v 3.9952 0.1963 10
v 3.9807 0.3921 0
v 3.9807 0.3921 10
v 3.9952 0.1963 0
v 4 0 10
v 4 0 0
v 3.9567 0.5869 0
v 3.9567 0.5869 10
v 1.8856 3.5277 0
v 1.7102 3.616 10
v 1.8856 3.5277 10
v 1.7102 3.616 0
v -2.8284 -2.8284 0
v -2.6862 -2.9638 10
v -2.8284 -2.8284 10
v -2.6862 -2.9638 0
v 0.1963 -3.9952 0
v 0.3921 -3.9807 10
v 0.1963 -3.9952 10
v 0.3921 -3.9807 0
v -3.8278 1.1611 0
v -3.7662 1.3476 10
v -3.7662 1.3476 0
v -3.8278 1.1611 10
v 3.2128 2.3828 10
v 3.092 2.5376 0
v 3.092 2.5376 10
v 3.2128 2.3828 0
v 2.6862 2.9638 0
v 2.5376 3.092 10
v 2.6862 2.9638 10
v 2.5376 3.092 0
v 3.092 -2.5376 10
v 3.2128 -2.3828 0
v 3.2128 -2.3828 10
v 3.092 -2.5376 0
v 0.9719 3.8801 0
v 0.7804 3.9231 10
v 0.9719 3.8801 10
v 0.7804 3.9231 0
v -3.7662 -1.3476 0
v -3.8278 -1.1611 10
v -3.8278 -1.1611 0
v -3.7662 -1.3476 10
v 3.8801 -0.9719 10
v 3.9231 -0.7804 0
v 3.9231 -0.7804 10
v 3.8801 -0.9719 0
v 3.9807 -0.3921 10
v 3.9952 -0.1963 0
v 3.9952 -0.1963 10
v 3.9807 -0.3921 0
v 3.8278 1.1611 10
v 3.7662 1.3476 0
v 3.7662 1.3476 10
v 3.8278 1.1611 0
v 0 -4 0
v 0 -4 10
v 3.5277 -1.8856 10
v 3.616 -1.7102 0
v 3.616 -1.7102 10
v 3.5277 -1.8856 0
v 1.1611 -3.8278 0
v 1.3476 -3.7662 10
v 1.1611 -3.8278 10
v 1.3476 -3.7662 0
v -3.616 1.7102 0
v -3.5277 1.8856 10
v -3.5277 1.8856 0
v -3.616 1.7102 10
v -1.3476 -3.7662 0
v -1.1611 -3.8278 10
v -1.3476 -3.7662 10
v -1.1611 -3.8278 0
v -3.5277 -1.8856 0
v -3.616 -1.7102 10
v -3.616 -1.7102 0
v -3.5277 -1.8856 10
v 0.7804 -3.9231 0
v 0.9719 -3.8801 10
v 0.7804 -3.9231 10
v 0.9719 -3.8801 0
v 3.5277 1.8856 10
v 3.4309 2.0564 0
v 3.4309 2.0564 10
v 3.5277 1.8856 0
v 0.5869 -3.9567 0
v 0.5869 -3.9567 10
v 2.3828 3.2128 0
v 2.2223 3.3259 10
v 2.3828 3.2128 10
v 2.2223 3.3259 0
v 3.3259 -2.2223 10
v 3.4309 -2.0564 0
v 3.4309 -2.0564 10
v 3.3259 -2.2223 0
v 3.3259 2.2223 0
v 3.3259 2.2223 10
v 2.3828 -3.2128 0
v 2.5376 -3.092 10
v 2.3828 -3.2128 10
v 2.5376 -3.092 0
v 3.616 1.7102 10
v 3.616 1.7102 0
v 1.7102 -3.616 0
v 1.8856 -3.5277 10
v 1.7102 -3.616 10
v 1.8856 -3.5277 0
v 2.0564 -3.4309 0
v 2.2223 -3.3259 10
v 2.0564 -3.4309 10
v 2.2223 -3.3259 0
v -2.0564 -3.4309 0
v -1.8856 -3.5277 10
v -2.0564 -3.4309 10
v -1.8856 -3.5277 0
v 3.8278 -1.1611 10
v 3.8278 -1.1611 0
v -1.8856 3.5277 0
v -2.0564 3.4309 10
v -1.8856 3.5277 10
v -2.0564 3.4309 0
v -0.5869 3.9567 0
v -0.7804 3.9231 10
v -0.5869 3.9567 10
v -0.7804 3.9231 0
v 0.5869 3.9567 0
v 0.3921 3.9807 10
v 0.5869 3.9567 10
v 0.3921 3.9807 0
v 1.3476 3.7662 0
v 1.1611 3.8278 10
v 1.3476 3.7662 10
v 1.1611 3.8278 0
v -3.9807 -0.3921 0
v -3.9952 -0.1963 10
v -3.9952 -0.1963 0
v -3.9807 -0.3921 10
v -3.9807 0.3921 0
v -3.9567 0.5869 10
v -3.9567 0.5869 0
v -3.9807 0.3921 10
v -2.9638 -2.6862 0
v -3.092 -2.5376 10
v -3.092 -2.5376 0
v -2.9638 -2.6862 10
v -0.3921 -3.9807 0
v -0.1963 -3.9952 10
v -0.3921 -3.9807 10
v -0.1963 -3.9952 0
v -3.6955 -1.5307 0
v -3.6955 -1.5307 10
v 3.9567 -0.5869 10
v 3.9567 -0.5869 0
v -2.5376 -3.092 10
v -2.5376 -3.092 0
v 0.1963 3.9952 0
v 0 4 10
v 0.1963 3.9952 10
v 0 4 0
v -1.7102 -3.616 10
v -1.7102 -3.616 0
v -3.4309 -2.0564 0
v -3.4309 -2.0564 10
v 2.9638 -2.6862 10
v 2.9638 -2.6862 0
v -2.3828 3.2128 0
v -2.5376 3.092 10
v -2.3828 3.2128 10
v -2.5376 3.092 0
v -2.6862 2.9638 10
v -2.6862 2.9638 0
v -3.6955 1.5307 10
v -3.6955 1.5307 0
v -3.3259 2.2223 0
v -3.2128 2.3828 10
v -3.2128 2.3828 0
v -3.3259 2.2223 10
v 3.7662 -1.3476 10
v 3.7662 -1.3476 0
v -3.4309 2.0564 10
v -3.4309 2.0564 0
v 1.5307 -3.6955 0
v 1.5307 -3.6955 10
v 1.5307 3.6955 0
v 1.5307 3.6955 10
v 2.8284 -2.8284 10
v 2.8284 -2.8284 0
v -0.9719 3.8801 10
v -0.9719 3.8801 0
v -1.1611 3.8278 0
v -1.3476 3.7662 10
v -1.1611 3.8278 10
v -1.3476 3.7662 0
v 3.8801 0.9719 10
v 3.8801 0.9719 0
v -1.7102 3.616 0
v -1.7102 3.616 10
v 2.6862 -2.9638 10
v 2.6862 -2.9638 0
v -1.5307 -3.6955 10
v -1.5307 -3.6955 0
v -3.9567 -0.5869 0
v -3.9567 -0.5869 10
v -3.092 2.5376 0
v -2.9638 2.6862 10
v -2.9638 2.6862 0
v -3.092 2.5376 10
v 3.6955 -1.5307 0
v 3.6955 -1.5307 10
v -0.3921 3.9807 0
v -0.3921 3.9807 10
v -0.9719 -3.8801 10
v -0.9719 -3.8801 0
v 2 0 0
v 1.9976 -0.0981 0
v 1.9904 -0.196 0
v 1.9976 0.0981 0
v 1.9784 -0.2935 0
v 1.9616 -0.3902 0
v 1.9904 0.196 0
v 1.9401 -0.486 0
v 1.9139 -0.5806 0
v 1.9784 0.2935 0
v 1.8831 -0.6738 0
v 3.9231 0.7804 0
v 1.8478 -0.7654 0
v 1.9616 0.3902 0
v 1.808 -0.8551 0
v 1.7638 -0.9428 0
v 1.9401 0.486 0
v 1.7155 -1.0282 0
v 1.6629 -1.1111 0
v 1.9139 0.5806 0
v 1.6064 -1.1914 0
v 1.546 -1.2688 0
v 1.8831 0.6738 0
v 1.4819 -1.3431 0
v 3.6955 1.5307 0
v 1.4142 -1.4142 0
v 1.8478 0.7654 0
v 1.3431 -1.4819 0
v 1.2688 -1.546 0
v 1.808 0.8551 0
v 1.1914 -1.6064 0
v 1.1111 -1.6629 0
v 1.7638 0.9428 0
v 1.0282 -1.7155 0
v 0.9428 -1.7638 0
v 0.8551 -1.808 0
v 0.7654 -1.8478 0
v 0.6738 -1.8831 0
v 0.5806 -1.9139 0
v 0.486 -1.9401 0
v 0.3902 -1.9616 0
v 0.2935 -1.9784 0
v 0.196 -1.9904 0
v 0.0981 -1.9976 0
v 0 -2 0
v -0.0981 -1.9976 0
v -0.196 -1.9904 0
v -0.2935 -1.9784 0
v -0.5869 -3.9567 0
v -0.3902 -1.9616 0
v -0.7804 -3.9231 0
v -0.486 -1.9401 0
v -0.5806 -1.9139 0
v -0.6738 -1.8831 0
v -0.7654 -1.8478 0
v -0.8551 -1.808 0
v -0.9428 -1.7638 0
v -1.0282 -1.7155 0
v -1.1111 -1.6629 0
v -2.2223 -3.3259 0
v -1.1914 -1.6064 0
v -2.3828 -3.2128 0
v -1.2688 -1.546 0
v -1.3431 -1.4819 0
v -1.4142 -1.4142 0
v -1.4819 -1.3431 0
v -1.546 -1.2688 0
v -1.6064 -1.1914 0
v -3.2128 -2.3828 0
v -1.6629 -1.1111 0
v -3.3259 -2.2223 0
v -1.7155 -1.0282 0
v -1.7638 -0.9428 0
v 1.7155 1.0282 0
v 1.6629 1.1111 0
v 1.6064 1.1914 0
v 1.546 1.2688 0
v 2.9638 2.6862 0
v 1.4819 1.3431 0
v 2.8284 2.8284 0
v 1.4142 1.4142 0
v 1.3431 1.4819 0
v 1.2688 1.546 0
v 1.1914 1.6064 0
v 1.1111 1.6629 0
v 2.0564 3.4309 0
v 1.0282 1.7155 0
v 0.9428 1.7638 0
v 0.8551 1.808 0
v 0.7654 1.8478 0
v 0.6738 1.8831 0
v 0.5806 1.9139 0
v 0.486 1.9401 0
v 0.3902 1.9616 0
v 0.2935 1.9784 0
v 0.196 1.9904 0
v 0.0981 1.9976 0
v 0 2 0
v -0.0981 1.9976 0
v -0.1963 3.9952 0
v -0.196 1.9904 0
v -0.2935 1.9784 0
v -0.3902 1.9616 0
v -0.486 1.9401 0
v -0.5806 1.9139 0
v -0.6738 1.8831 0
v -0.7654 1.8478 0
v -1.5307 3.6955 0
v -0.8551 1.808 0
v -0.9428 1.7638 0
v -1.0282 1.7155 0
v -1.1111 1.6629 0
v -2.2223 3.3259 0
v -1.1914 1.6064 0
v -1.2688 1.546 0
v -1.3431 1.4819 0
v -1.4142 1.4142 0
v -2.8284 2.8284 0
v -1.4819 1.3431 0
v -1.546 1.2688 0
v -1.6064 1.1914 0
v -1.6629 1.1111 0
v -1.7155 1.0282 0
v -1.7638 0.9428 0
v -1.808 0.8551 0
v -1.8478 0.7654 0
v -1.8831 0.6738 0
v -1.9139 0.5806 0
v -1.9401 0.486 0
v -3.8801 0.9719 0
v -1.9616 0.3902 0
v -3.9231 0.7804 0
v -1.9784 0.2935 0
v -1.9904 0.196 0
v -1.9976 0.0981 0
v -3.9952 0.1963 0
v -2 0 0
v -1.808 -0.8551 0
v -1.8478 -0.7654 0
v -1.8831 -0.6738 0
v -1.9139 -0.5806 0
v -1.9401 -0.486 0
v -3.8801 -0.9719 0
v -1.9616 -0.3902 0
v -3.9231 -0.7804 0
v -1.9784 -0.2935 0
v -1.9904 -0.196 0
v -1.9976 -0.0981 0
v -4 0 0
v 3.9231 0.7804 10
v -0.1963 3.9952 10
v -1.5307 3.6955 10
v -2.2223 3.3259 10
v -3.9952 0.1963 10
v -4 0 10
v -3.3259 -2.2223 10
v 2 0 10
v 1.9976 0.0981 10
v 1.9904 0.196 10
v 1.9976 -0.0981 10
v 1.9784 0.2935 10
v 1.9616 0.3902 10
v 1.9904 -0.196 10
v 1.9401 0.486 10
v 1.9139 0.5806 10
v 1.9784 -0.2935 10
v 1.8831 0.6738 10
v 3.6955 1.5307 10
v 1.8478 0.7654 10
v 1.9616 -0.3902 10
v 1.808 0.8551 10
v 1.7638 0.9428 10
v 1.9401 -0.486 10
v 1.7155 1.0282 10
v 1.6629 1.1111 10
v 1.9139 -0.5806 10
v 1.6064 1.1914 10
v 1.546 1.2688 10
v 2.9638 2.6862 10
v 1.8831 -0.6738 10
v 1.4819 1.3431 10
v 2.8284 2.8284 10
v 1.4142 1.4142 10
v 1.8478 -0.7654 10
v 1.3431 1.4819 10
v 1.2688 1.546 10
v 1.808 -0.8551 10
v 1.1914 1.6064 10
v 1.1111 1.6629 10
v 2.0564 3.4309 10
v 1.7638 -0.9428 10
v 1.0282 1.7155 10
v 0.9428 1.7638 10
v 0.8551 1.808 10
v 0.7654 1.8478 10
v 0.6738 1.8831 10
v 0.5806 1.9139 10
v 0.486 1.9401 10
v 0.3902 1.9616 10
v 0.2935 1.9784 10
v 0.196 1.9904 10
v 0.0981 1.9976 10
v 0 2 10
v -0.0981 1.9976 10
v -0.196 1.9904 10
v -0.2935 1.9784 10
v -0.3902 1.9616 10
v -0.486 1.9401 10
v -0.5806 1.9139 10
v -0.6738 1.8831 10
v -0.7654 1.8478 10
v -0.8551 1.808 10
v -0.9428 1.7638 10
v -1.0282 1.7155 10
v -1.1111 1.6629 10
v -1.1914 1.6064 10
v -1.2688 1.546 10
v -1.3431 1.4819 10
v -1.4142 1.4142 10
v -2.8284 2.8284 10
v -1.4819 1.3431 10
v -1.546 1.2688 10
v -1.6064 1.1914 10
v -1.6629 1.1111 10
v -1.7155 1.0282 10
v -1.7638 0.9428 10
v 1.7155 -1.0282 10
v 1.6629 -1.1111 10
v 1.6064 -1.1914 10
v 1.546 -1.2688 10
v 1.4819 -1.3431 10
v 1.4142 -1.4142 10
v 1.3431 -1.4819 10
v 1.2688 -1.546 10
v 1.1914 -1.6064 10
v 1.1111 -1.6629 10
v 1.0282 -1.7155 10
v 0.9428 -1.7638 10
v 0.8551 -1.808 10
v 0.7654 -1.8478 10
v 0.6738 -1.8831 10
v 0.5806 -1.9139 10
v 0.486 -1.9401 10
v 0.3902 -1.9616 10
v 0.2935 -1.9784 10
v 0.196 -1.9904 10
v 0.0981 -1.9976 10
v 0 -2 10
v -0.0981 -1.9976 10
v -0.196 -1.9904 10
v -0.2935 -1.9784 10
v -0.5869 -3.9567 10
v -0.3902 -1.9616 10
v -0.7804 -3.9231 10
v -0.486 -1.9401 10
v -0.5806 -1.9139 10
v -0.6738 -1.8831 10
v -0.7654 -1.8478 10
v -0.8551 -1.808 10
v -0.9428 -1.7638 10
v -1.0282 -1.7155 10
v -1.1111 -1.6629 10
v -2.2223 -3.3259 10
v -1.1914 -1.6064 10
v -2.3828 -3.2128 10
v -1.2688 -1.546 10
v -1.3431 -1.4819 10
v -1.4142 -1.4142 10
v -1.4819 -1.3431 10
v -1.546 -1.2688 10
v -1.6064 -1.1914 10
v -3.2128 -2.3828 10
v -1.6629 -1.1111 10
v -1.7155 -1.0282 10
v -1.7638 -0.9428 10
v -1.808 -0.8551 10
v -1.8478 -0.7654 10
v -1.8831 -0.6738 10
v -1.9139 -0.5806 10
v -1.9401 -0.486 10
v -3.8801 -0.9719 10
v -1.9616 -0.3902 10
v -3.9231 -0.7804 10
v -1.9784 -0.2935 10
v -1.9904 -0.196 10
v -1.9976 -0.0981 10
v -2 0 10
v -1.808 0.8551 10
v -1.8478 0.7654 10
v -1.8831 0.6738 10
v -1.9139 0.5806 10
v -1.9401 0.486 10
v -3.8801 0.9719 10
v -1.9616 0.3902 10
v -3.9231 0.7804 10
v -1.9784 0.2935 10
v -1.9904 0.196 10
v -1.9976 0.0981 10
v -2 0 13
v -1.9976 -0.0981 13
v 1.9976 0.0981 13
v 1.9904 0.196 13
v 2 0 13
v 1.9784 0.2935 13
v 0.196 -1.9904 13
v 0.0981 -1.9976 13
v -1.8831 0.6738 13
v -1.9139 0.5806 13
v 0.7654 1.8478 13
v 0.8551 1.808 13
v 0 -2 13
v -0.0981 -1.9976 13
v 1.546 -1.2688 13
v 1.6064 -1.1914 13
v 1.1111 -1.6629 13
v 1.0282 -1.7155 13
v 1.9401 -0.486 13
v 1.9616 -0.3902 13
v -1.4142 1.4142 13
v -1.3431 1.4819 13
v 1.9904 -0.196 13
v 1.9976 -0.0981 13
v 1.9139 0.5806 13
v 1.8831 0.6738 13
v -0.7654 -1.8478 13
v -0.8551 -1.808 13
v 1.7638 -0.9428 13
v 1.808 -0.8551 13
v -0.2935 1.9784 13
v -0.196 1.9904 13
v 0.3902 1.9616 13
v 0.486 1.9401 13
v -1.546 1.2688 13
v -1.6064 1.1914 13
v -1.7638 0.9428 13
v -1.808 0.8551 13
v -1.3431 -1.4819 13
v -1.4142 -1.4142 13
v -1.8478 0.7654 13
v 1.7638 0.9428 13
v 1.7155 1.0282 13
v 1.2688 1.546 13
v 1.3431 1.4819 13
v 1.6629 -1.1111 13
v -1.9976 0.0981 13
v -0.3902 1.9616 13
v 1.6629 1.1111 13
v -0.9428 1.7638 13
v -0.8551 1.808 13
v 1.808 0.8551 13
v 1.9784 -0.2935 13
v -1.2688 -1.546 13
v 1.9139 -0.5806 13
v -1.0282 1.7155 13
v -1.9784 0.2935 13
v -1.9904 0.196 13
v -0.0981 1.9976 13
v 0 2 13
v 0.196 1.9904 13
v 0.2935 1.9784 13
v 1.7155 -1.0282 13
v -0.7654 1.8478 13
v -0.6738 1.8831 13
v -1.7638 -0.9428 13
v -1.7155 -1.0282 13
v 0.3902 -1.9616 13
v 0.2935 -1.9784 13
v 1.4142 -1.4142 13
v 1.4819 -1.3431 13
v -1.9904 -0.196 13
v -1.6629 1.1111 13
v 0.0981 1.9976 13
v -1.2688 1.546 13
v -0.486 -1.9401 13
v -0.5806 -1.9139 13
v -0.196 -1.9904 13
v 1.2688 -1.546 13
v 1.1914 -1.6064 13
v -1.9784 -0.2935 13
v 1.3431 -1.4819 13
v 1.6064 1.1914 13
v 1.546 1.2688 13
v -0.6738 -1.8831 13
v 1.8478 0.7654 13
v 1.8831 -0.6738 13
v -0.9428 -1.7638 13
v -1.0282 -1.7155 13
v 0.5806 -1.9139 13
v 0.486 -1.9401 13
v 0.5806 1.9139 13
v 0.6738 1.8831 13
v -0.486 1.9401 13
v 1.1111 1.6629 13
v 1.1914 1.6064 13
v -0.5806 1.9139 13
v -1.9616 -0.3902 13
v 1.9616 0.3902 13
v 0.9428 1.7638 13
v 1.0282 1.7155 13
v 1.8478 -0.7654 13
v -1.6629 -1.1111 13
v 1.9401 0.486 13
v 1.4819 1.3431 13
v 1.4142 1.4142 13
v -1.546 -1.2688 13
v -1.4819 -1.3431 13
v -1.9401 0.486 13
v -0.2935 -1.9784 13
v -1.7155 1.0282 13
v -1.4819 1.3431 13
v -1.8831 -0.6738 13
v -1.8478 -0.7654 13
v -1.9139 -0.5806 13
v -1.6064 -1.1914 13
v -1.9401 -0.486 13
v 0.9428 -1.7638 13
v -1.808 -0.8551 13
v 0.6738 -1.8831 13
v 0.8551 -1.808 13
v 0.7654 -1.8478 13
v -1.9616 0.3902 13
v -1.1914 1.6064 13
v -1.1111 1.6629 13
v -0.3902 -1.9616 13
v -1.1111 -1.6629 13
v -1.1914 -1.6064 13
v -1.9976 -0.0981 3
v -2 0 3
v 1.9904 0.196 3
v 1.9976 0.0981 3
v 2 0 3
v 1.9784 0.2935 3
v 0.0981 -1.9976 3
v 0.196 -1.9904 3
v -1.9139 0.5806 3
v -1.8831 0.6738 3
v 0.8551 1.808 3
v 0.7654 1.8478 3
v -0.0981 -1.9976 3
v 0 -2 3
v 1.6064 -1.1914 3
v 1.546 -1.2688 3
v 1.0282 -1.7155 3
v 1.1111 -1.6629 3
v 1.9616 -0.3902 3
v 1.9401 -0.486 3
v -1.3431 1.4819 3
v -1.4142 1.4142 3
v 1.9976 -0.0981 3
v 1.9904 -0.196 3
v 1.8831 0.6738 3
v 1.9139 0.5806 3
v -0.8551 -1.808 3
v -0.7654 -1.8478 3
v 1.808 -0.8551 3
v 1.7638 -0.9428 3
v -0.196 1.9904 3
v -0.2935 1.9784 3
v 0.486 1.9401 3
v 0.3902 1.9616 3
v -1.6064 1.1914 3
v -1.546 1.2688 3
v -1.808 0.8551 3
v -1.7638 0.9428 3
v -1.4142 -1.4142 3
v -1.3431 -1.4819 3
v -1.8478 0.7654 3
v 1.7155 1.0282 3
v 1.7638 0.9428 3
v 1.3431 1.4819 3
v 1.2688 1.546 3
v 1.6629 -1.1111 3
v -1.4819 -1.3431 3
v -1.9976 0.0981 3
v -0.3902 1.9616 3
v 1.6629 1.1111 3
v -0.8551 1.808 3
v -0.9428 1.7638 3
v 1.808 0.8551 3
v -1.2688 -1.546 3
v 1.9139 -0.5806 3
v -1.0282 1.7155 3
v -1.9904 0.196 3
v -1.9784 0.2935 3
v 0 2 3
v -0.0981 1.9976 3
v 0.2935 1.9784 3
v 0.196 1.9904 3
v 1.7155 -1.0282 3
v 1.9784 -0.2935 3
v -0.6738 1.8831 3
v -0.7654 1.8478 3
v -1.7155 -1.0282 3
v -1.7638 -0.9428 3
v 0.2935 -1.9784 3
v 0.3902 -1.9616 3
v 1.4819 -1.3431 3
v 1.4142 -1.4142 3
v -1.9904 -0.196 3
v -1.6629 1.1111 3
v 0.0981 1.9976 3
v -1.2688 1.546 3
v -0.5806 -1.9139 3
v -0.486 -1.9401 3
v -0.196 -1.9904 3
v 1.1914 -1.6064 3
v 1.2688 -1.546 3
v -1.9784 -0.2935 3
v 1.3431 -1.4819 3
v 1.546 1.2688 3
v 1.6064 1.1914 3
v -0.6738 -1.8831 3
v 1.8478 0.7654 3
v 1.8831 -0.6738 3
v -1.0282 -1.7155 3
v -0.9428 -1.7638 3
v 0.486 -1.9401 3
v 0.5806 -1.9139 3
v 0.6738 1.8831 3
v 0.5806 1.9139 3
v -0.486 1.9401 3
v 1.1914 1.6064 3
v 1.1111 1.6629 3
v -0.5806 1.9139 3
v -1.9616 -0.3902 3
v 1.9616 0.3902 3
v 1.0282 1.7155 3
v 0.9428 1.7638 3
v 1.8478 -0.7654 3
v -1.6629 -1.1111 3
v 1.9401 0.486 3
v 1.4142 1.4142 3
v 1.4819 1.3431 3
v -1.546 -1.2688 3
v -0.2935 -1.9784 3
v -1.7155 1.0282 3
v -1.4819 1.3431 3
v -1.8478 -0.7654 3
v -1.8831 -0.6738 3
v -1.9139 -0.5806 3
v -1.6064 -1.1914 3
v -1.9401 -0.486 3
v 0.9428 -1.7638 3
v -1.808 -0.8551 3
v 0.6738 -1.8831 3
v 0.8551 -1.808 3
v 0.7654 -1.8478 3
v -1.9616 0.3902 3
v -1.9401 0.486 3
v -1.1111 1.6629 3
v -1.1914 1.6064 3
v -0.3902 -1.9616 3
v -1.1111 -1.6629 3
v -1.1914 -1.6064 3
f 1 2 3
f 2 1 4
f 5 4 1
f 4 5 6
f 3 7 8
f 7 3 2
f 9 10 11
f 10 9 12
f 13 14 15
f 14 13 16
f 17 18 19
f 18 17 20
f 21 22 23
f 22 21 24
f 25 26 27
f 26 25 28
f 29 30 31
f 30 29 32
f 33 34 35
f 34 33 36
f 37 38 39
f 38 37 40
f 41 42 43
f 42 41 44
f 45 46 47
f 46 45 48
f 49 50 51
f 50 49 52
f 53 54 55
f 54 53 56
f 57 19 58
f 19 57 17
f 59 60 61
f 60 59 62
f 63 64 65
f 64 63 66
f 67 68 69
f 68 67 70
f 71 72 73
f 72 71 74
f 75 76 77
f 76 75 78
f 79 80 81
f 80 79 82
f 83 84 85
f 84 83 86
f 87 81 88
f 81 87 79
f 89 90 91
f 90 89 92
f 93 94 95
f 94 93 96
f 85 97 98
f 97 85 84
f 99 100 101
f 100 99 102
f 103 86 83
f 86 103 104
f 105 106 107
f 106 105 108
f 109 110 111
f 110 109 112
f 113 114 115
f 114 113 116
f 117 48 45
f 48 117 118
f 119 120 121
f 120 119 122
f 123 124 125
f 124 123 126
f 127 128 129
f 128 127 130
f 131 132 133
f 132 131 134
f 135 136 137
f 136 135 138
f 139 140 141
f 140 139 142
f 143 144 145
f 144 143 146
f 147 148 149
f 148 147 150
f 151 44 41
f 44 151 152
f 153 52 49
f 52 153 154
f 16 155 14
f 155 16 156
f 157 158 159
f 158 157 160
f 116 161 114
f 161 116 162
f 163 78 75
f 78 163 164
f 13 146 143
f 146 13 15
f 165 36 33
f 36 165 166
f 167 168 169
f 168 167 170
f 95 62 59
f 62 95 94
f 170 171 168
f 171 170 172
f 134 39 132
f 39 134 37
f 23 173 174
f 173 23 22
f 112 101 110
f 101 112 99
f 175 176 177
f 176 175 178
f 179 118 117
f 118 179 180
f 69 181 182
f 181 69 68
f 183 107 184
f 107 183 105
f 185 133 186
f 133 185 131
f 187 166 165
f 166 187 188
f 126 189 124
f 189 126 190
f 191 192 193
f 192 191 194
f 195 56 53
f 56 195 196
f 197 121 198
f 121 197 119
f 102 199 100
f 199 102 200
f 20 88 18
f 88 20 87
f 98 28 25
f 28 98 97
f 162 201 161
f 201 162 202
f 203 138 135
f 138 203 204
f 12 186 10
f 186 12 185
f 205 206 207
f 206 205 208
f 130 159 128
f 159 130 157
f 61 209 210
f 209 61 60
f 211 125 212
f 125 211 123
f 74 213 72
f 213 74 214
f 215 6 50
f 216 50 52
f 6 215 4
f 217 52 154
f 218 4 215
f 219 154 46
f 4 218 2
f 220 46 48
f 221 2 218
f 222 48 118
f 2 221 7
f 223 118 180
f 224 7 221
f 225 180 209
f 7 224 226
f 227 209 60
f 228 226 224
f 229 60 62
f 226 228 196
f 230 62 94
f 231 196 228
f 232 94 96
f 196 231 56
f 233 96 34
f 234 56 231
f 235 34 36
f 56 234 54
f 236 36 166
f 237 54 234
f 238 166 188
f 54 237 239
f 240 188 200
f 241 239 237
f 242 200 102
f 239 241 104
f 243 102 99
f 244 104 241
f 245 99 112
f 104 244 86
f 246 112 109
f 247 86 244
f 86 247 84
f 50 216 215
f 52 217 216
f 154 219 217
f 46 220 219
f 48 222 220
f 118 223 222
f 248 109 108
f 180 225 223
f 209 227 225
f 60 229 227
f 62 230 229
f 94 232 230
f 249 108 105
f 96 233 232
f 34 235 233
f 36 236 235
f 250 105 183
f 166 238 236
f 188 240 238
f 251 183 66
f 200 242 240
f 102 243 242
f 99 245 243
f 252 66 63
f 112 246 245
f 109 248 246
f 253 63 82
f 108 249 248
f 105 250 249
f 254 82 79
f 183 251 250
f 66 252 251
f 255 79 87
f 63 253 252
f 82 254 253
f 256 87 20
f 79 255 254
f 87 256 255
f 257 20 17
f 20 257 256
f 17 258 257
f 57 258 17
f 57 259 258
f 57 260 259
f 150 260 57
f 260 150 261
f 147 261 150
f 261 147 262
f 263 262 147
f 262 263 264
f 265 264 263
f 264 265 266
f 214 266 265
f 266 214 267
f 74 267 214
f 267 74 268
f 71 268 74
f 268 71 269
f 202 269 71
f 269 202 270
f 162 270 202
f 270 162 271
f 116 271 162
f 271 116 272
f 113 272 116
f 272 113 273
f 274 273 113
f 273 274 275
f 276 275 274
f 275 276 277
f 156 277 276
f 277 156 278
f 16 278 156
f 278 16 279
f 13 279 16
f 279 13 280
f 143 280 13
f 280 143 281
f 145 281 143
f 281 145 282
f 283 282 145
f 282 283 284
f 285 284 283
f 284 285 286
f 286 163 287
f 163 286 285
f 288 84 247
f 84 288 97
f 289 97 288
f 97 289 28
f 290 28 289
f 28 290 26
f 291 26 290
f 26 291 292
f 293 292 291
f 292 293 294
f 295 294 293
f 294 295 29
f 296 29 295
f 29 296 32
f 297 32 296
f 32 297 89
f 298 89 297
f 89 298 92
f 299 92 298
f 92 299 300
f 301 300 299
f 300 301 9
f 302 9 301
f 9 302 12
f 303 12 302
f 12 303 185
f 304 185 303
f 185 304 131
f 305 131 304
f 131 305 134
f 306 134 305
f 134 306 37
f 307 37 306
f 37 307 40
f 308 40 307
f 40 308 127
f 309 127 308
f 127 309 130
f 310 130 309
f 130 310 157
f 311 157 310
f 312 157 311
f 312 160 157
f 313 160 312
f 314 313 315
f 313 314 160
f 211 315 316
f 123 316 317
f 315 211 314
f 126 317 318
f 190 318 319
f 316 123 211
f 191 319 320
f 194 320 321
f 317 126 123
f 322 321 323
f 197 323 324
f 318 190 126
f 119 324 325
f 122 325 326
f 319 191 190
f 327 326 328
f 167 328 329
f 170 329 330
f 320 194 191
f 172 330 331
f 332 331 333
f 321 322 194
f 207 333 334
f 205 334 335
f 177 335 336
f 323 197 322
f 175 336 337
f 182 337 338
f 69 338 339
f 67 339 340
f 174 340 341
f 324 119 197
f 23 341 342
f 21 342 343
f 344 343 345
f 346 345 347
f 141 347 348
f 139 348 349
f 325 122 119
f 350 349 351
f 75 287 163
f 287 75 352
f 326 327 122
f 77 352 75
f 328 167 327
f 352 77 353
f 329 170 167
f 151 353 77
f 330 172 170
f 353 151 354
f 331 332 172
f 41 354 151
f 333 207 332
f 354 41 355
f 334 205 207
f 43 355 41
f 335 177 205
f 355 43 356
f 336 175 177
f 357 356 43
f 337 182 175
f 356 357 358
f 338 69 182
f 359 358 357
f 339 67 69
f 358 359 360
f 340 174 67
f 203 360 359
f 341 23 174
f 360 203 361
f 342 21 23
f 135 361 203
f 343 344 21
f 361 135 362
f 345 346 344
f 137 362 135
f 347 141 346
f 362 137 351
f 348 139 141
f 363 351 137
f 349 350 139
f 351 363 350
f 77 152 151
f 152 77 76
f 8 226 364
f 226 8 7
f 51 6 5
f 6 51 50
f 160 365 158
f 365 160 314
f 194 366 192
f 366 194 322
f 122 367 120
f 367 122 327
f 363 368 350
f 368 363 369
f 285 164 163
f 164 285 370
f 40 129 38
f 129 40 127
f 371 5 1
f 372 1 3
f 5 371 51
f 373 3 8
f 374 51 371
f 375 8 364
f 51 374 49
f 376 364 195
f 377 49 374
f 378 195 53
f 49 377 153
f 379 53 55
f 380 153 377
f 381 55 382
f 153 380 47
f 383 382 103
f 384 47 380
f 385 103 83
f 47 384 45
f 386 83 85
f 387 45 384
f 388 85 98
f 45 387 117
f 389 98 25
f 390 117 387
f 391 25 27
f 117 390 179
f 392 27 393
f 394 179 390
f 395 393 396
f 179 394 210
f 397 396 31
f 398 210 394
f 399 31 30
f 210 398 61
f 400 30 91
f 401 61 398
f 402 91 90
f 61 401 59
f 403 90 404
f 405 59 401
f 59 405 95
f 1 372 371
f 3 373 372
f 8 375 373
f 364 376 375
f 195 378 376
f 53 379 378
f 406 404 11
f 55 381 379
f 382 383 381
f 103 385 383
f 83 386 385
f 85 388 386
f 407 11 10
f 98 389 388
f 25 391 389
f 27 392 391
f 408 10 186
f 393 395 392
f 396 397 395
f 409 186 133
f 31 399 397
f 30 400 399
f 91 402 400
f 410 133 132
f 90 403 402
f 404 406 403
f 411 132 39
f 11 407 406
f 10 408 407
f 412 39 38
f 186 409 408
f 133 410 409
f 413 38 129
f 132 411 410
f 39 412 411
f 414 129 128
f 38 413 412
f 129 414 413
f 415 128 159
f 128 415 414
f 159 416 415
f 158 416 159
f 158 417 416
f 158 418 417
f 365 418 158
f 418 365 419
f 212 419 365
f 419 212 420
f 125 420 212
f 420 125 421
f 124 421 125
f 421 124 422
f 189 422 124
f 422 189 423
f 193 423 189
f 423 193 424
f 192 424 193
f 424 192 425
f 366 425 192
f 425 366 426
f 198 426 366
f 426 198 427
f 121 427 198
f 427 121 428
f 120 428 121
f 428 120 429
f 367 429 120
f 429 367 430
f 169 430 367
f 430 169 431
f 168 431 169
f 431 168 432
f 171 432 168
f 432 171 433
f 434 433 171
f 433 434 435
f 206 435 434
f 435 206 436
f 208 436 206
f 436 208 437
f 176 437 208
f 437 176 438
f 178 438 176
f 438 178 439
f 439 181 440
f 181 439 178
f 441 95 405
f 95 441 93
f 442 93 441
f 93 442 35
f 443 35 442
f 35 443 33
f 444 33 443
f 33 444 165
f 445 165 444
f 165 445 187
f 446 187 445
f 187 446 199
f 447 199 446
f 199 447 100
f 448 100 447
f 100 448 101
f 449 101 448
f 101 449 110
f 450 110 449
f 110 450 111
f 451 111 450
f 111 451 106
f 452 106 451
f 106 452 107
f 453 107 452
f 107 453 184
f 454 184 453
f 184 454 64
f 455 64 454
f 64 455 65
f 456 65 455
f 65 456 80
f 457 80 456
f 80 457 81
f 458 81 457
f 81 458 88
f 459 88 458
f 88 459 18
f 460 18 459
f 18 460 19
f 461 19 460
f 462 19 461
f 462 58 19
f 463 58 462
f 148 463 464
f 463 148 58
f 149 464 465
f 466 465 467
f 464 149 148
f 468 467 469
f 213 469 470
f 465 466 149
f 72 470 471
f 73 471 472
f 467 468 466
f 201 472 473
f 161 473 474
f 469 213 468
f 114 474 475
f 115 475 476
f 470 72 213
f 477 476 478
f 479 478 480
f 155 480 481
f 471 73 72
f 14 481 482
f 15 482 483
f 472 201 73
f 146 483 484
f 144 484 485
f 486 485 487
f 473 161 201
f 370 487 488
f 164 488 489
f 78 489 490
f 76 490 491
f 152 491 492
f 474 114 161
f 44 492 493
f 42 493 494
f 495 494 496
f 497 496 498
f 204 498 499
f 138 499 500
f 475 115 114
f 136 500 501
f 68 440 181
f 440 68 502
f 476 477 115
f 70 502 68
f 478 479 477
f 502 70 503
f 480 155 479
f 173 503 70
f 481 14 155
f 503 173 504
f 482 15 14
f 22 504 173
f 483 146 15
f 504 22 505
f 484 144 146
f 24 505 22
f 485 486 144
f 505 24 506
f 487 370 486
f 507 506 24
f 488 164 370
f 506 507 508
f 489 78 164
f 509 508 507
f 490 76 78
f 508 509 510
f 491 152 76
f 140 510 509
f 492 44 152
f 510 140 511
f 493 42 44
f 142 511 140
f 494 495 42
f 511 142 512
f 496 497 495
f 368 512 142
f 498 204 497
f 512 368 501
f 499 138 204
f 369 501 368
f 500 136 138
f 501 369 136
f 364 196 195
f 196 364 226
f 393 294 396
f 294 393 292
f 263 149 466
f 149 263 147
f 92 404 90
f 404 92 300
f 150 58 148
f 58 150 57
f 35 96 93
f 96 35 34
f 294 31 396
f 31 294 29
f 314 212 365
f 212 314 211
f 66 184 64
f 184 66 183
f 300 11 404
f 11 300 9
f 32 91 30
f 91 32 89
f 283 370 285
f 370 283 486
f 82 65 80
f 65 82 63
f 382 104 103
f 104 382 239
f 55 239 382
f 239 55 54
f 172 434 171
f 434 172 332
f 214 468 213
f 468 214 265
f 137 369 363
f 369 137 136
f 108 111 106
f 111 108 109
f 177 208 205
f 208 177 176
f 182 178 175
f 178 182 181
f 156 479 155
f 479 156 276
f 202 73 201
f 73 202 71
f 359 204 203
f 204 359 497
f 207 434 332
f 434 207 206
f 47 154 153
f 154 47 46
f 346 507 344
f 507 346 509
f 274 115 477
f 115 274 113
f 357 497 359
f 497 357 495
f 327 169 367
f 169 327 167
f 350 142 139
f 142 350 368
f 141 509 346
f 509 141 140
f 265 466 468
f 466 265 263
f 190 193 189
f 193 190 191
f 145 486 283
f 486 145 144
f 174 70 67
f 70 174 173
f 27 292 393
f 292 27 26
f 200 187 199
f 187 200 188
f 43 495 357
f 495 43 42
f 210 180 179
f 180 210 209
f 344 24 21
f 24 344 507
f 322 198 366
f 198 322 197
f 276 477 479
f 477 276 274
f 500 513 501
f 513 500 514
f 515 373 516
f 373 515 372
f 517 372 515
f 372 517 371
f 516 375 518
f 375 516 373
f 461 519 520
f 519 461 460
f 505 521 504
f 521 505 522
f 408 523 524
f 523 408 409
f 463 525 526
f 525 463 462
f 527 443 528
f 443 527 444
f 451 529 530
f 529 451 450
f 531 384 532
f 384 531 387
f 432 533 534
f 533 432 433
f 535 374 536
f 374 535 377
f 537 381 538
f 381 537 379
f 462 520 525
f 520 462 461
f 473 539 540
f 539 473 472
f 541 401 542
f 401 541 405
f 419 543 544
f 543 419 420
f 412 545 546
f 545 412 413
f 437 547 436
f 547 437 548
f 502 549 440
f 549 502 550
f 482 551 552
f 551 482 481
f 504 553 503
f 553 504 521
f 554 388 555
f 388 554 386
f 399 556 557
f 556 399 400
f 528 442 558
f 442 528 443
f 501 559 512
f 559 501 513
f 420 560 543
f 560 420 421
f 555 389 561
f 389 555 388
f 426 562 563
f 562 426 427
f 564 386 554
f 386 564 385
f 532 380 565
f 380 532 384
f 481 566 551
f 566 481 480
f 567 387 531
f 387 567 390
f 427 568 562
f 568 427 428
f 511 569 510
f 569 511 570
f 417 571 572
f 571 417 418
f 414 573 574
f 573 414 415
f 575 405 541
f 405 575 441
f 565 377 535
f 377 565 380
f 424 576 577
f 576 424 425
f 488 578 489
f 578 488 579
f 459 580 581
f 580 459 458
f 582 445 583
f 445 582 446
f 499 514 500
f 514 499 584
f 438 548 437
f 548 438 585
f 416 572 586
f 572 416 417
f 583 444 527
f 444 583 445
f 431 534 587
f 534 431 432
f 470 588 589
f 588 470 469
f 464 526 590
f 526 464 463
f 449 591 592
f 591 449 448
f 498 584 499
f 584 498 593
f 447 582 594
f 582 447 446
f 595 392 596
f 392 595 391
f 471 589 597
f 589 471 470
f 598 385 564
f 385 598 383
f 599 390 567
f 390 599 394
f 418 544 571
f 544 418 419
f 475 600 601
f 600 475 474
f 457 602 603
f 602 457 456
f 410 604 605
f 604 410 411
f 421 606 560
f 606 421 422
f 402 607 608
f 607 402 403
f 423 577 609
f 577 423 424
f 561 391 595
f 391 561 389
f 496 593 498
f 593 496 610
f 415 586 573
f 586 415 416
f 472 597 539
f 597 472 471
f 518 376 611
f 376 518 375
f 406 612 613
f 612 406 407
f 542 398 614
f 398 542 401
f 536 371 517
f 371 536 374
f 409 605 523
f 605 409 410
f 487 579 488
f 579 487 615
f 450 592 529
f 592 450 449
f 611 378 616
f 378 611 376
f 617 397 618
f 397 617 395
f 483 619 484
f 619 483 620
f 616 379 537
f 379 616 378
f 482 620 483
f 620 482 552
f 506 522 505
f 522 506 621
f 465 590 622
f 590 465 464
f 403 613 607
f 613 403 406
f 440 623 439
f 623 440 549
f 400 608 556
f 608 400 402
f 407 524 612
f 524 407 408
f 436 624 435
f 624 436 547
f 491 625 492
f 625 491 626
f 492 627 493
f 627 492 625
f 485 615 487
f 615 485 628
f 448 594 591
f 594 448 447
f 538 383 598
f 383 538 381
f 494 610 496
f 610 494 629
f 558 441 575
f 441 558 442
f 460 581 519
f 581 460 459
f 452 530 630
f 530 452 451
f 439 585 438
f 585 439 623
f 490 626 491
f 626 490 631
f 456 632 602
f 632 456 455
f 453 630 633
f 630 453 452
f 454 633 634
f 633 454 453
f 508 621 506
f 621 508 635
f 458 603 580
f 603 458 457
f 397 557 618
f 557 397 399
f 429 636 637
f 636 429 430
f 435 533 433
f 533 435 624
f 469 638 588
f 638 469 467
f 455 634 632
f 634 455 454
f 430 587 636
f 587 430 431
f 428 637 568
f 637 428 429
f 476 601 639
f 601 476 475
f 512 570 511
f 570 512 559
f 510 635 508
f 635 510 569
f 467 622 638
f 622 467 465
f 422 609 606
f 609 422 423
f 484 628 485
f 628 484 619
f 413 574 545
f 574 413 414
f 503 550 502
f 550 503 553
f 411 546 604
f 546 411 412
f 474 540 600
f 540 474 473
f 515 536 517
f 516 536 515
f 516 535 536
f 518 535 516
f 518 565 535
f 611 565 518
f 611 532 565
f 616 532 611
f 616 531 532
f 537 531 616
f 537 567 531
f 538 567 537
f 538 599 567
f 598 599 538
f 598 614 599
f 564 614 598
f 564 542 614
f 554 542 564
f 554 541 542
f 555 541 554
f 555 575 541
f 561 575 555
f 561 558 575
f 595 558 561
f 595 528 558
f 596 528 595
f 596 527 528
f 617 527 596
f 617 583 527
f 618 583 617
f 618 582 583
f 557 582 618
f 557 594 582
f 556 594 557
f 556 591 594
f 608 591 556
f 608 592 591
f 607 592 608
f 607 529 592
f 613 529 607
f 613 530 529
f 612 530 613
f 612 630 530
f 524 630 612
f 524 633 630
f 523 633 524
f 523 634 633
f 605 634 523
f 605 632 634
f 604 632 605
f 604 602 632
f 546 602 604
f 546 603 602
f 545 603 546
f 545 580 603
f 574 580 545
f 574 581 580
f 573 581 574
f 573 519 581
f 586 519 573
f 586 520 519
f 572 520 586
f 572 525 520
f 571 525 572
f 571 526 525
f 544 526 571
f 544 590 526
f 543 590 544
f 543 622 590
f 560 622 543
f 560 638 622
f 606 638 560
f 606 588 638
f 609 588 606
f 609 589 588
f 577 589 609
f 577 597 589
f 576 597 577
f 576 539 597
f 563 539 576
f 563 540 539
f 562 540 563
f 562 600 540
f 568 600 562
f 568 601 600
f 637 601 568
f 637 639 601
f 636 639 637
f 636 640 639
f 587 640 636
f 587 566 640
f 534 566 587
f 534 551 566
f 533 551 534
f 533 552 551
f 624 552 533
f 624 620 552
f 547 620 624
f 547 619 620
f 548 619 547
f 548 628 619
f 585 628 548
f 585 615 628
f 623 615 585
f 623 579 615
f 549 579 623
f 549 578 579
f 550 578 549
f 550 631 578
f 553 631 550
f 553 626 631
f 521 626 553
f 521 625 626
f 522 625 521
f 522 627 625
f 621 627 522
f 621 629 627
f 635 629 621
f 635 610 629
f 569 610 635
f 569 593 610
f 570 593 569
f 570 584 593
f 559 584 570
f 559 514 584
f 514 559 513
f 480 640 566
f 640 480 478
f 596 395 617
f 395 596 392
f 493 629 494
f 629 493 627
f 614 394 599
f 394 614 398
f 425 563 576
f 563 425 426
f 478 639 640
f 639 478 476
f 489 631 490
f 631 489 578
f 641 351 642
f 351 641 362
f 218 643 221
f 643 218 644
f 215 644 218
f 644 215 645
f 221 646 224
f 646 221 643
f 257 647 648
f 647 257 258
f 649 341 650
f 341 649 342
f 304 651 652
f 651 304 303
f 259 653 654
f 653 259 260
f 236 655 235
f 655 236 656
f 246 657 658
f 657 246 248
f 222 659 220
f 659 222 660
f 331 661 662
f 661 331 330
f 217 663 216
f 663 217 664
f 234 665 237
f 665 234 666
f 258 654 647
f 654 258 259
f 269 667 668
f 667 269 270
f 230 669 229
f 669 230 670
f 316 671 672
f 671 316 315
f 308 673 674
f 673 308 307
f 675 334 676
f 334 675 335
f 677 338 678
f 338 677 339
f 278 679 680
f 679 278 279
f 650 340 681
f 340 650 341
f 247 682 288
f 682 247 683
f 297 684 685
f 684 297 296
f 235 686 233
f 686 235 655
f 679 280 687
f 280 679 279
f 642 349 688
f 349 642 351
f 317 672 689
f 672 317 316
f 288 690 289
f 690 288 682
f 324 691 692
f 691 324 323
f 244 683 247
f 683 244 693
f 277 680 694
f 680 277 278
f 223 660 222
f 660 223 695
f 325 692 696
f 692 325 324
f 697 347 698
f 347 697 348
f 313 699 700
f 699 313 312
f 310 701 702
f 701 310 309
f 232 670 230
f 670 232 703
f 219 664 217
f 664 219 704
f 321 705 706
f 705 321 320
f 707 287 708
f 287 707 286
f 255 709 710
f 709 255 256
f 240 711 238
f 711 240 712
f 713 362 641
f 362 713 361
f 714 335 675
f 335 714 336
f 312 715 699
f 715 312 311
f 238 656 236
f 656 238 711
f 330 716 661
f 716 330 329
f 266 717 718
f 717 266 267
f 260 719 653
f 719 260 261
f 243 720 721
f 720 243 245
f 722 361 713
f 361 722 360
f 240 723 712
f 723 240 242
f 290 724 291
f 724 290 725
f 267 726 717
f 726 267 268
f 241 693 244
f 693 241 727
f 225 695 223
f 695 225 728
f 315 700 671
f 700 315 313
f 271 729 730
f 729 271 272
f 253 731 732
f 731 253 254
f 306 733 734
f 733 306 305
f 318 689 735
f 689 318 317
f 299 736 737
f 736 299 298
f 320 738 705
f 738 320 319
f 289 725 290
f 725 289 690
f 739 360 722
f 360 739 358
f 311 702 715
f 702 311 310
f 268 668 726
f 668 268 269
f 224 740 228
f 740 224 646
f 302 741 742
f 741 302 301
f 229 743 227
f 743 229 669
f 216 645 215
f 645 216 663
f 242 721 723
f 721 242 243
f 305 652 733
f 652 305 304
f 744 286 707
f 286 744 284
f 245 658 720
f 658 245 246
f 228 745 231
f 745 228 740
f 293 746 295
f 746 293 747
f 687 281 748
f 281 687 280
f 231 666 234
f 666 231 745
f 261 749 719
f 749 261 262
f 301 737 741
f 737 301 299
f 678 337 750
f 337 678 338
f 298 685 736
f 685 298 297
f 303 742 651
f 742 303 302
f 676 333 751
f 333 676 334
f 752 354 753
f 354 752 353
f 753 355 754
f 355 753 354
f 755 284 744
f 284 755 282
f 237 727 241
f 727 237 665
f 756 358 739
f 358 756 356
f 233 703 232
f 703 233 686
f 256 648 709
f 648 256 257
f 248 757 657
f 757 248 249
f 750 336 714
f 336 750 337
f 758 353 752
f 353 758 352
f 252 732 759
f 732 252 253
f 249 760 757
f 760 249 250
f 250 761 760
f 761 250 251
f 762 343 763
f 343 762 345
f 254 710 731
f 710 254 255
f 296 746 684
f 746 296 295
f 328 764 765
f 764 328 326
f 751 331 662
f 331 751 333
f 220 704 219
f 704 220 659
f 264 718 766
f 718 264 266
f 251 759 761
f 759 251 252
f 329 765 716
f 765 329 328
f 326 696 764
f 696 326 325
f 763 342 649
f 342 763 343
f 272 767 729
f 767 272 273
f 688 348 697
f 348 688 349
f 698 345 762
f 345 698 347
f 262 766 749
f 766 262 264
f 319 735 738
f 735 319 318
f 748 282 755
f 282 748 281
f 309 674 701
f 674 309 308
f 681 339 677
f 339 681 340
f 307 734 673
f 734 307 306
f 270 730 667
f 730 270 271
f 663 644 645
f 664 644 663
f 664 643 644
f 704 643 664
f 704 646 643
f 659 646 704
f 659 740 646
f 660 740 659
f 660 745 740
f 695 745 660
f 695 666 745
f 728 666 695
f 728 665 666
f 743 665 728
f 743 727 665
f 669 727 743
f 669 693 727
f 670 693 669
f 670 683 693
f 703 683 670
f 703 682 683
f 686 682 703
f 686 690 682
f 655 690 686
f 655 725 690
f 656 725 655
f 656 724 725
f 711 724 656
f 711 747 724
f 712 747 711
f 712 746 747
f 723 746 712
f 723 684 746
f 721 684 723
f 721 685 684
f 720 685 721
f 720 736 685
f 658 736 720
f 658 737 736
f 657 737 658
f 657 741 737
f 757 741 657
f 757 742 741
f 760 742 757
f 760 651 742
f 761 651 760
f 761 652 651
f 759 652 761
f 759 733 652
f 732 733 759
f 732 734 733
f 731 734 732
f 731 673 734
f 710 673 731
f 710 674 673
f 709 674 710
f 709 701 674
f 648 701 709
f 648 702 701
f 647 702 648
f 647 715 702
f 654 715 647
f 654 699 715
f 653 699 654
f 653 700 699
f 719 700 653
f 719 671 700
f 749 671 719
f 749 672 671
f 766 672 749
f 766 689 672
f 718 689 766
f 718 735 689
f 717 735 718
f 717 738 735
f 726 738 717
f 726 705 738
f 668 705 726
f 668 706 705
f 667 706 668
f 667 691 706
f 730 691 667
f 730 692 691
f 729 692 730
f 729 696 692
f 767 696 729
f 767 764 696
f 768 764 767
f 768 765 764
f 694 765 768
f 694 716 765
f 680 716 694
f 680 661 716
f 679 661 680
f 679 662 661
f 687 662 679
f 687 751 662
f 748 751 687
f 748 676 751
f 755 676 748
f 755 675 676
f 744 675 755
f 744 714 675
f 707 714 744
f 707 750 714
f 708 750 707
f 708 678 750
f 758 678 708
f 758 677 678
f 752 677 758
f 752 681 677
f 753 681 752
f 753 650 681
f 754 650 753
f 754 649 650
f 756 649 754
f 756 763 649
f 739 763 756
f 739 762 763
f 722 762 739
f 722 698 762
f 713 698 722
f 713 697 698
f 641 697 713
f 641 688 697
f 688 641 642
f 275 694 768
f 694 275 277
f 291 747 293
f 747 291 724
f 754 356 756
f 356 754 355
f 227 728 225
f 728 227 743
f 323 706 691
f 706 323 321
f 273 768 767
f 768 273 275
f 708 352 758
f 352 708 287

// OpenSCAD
// Units: mm. Round fit prototype, NOT a model of the SG90 spline teeth.
// The male projection of 3 mm is assumed to match the requested socket depth.
$fn=128;
body_length=10;
body_diameter=8;
male_diameter=4;
male_length=3;
female_diameter=4;
female_depth=3;
difference() {
    union() {
        cylinder(h=body_length,d=body_diameter);
        translate([0,0,body_length]) cylinder(h=male_length,d=male_diameter);
    }
    translate([0,0,-0.01]) cylinder(h=female_depth+0.01,d=female_diameter);
}
